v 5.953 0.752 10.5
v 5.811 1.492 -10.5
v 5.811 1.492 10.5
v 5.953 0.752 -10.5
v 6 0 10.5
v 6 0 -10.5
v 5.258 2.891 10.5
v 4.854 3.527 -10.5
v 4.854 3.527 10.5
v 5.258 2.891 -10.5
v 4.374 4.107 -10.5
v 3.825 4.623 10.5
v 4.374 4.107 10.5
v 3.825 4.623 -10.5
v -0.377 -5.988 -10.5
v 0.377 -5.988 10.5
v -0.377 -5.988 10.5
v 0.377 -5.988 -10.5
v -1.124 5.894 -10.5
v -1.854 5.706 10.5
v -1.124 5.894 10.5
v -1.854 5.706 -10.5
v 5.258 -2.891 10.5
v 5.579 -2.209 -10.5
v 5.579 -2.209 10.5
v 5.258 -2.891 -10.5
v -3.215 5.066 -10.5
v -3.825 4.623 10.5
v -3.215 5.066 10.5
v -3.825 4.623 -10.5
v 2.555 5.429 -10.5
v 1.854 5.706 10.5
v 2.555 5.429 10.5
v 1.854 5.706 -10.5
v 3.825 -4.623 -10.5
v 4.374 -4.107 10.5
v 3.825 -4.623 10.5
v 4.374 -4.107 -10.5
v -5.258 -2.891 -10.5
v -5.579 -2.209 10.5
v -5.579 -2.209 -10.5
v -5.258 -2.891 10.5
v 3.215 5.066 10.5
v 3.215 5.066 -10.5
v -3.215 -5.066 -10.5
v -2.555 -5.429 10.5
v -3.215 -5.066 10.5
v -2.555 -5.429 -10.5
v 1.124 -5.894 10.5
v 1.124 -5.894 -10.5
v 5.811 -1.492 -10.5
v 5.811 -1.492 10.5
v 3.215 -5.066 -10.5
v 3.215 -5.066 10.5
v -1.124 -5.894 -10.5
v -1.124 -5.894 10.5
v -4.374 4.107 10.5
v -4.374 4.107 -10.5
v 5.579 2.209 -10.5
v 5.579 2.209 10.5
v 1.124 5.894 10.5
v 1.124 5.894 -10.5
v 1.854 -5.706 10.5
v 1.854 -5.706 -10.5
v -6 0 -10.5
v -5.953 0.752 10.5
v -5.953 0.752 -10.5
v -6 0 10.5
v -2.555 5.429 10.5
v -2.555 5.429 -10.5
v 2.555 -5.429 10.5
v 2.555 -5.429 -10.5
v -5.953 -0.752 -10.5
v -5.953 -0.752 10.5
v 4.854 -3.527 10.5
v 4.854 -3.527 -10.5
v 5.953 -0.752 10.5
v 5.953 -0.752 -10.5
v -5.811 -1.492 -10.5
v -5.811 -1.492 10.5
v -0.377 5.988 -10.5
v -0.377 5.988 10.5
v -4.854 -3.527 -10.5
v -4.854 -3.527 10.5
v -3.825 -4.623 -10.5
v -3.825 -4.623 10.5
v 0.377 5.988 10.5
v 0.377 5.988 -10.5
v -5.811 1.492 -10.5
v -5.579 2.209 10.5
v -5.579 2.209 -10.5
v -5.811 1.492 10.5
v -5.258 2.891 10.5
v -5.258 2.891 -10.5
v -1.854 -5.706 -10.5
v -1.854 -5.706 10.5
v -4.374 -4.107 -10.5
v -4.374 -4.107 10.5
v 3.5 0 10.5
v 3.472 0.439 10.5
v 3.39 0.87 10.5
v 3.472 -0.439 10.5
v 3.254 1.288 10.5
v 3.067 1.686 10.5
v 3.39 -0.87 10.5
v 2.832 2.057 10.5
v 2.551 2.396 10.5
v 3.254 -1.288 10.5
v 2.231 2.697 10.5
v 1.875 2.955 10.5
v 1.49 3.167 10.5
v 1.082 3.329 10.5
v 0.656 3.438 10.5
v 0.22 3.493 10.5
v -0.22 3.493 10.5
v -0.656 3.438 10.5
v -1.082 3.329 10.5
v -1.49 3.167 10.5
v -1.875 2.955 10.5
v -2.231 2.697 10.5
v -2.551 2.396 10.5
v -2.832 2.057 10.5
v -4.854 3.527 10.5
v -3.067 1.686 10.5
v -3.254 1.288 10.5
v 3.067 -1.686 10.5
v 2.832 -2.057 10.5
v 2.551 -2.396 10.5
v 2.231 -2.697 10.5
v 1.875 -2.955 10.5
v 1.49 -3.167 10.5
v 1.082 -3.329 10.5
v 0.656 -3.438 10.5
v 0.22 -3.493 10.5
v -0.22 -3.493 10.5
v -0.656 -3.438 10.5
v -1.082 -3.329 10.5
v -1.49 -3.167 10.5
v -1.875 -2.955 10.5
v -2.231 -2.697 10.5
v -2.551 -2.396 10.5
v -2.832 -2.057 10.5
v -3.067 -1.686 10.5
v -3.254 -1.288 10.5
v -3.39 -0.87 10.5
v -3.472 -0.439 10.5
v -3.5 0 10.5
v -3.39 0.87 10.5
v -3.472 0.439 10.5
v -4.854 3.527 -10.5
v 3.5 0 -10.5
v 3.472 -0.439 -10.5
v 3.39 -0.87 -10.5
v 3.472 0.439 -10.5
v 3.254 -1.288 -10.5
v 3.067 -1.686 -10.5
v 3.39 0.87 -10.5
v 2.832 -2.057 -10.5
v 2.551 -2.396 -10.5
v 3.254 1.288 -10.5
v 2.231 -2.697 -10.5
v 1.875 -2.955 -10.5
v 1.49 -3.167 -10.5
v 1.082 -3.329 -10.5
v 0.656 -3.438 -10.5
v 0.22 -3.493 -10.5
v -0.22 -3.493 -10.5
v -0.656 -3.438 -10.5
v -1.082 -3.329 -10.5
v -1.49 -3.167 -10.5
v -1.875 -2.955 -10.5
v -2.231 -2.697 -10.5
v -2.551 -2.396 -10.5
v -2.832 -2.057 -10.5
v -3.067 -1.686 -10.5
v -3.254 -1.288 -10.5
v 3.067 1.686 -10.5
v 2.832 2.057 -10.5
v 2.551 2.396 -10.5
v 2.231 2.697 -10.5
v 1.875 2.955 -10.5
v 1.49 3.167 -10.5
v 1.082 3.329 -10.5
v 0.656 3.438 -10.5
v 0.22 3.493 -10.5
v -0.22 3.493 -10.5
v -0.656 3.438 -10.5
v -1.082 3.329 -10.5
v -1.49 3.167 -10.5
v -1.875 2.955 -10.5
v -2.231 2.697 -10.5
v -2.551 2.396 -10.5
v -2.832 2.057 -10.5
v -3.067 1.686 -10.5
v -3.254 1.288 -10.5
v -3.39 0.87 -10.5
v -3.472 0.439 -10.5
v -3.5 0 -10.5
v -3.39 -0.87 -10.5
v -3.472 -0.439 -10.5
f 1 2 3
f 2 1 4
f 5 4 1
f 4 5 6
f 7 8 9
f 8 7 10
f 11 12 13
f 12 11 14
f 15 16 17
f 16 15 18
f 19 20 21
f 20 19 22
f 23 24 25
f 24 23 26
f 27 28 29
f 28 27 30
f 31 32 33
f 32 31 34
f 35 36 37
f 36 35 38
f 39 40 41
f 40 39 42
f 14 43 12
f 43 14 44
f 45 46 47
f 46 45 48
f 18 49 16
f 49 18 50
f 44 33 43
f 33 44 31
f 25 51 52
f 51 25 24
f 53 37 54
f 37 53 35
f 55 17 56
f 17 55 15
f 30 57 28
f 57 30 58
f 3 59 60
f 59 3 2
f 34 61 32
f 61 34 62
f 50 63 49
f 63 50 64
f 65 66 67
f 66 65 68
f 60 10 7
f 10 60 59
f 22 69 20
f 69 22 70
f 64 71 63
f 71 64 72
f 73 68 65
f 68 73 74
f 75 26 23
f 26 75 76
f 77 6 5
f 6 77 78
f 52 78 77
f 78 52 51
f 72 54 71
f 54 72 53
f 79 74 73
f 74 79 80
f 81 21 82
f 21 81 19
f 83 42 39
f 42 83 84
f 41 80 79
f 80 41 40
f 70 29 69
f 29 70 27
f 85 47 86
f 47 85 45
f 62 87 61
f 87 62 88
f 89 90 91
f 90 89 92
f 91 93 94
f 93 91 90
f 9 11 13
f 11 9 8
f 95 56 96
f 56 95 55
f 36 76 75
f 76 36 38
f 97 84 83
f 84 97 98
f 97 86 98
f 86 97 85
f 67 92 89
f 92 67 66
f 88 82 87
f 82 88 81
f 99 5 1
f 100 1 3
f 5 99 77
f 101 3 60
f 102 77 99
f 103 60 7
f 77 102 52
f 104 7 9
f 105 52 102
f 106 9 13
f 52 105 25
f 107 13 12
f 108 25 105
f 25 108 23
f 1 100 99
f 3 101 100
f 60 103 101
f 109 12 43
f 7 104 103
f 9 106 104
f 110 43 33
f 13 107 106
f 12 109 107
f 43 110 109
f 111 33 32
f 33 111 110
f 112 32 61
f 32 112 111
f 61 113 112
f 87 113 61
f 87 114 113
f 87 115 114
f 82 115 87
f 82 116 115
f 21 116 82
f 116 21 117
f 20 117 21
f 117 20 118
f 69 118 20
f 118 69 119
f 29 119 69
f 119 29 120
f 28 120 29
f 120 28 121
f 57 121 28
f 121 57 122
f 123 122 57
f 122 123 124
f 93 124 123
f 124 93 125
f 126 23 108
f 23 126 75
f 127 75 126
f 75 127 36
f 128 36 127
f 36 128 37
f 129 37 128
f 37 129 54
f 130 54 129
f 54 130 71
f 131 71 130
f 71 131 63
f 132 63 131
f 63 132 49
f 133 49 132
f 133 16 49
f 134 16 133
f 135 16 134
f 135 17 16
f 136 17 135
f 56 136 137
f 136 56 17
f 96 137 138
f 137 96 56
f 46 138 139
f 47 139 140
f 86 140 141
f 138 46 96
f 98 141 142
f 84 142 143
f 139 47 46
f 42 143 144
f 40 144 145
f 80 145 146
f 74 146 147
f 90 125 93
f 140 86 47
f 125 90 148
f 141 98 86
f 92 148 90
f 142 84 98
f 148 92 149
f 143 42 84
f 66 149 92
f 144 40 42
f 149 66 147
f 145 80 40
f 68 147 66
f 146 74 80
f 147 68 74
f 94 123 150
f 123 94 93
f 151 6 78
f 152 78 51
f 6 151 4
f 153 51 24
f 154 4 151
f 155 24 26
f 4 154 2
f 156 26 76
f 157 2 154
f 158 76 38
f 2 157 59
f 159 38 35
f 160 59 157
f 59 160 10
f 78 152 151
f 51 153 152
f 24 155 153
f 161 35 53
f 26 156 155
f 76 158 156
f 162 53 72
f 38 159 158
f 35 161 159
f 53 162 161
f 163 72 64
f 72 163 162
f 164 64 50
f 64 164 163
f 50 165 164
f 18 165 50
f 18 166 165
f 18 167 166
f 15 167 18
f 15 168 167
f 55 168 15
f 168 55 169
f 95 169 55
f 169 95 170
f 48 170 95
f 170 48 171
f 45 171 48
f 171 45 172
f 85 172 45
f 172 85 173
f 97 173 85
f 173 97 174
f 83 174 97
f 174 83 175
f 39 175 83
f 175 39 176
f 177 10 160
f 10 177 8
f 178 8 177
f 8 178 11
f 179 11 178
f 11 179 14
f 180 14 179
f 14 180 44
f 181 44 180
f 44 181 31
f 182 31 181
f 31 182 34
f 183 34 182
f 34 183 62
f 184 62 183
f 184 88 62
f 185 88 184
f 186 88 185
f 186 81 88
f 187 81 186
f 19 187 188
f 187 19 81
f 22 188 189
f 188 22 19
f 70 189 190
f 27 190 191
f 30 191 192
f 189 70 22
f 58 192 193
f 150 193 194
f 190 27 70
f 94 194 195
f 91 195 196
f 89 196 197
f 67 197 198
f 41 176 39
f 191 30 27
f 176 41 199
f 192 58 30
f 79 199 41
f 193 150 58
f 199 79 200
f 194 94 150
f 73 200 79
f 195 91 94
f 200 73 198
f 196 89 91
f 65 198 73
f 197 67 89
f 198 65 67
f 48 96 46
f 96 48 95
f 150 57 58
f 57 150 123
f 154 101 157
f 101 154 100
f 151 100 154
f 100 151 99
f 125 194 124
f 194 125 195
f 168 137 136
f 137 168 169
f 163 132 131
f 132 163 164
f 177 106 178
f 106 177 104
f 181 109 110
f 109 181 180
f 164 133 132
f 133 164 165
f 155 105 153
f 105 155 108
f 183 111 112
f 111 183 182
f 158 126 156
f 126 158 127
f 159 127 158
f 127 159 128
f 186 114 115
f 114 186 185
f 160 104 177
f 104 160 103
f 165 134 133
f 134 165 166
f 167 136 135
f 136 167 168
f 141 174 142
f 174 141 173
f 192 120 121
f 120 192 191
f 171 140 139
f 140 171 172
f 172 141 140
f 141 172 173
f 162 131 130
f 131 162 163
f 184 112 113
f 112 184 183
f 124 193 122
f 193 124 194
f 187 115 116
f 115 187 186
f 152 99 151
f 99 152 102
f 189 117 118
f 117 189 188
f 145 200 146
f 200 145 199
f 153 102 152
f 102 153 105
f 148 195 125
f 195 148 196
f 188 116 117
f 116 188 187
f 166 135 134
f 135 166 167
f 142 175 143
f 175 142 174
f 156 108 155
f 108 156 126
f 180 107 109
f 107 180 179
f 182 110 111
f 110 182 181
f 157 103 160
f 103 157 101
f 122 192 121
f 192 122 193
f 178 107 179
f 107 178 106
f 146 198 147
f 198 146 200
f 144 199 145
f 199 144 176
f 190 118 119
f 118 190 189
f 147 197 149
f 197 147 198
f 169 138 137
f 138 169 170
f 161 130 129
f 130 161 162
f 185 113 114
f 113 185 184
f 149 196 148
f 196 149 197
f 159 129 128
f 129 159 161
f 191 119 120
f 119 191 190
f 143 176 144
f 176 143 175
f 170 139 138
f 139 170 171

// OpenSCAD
$fn = 50;


difference() {
	union() {
		translate(v = [0, 0, -10.5000000000]) {
			cylinder(h = 21, r = 6.0000000000);
		}
	}
	union() {
		translate(v = [0, 0, -100.0000000000]) {
			cylinder(h = 200, r = 3.5000000000);
		}
	}
}
